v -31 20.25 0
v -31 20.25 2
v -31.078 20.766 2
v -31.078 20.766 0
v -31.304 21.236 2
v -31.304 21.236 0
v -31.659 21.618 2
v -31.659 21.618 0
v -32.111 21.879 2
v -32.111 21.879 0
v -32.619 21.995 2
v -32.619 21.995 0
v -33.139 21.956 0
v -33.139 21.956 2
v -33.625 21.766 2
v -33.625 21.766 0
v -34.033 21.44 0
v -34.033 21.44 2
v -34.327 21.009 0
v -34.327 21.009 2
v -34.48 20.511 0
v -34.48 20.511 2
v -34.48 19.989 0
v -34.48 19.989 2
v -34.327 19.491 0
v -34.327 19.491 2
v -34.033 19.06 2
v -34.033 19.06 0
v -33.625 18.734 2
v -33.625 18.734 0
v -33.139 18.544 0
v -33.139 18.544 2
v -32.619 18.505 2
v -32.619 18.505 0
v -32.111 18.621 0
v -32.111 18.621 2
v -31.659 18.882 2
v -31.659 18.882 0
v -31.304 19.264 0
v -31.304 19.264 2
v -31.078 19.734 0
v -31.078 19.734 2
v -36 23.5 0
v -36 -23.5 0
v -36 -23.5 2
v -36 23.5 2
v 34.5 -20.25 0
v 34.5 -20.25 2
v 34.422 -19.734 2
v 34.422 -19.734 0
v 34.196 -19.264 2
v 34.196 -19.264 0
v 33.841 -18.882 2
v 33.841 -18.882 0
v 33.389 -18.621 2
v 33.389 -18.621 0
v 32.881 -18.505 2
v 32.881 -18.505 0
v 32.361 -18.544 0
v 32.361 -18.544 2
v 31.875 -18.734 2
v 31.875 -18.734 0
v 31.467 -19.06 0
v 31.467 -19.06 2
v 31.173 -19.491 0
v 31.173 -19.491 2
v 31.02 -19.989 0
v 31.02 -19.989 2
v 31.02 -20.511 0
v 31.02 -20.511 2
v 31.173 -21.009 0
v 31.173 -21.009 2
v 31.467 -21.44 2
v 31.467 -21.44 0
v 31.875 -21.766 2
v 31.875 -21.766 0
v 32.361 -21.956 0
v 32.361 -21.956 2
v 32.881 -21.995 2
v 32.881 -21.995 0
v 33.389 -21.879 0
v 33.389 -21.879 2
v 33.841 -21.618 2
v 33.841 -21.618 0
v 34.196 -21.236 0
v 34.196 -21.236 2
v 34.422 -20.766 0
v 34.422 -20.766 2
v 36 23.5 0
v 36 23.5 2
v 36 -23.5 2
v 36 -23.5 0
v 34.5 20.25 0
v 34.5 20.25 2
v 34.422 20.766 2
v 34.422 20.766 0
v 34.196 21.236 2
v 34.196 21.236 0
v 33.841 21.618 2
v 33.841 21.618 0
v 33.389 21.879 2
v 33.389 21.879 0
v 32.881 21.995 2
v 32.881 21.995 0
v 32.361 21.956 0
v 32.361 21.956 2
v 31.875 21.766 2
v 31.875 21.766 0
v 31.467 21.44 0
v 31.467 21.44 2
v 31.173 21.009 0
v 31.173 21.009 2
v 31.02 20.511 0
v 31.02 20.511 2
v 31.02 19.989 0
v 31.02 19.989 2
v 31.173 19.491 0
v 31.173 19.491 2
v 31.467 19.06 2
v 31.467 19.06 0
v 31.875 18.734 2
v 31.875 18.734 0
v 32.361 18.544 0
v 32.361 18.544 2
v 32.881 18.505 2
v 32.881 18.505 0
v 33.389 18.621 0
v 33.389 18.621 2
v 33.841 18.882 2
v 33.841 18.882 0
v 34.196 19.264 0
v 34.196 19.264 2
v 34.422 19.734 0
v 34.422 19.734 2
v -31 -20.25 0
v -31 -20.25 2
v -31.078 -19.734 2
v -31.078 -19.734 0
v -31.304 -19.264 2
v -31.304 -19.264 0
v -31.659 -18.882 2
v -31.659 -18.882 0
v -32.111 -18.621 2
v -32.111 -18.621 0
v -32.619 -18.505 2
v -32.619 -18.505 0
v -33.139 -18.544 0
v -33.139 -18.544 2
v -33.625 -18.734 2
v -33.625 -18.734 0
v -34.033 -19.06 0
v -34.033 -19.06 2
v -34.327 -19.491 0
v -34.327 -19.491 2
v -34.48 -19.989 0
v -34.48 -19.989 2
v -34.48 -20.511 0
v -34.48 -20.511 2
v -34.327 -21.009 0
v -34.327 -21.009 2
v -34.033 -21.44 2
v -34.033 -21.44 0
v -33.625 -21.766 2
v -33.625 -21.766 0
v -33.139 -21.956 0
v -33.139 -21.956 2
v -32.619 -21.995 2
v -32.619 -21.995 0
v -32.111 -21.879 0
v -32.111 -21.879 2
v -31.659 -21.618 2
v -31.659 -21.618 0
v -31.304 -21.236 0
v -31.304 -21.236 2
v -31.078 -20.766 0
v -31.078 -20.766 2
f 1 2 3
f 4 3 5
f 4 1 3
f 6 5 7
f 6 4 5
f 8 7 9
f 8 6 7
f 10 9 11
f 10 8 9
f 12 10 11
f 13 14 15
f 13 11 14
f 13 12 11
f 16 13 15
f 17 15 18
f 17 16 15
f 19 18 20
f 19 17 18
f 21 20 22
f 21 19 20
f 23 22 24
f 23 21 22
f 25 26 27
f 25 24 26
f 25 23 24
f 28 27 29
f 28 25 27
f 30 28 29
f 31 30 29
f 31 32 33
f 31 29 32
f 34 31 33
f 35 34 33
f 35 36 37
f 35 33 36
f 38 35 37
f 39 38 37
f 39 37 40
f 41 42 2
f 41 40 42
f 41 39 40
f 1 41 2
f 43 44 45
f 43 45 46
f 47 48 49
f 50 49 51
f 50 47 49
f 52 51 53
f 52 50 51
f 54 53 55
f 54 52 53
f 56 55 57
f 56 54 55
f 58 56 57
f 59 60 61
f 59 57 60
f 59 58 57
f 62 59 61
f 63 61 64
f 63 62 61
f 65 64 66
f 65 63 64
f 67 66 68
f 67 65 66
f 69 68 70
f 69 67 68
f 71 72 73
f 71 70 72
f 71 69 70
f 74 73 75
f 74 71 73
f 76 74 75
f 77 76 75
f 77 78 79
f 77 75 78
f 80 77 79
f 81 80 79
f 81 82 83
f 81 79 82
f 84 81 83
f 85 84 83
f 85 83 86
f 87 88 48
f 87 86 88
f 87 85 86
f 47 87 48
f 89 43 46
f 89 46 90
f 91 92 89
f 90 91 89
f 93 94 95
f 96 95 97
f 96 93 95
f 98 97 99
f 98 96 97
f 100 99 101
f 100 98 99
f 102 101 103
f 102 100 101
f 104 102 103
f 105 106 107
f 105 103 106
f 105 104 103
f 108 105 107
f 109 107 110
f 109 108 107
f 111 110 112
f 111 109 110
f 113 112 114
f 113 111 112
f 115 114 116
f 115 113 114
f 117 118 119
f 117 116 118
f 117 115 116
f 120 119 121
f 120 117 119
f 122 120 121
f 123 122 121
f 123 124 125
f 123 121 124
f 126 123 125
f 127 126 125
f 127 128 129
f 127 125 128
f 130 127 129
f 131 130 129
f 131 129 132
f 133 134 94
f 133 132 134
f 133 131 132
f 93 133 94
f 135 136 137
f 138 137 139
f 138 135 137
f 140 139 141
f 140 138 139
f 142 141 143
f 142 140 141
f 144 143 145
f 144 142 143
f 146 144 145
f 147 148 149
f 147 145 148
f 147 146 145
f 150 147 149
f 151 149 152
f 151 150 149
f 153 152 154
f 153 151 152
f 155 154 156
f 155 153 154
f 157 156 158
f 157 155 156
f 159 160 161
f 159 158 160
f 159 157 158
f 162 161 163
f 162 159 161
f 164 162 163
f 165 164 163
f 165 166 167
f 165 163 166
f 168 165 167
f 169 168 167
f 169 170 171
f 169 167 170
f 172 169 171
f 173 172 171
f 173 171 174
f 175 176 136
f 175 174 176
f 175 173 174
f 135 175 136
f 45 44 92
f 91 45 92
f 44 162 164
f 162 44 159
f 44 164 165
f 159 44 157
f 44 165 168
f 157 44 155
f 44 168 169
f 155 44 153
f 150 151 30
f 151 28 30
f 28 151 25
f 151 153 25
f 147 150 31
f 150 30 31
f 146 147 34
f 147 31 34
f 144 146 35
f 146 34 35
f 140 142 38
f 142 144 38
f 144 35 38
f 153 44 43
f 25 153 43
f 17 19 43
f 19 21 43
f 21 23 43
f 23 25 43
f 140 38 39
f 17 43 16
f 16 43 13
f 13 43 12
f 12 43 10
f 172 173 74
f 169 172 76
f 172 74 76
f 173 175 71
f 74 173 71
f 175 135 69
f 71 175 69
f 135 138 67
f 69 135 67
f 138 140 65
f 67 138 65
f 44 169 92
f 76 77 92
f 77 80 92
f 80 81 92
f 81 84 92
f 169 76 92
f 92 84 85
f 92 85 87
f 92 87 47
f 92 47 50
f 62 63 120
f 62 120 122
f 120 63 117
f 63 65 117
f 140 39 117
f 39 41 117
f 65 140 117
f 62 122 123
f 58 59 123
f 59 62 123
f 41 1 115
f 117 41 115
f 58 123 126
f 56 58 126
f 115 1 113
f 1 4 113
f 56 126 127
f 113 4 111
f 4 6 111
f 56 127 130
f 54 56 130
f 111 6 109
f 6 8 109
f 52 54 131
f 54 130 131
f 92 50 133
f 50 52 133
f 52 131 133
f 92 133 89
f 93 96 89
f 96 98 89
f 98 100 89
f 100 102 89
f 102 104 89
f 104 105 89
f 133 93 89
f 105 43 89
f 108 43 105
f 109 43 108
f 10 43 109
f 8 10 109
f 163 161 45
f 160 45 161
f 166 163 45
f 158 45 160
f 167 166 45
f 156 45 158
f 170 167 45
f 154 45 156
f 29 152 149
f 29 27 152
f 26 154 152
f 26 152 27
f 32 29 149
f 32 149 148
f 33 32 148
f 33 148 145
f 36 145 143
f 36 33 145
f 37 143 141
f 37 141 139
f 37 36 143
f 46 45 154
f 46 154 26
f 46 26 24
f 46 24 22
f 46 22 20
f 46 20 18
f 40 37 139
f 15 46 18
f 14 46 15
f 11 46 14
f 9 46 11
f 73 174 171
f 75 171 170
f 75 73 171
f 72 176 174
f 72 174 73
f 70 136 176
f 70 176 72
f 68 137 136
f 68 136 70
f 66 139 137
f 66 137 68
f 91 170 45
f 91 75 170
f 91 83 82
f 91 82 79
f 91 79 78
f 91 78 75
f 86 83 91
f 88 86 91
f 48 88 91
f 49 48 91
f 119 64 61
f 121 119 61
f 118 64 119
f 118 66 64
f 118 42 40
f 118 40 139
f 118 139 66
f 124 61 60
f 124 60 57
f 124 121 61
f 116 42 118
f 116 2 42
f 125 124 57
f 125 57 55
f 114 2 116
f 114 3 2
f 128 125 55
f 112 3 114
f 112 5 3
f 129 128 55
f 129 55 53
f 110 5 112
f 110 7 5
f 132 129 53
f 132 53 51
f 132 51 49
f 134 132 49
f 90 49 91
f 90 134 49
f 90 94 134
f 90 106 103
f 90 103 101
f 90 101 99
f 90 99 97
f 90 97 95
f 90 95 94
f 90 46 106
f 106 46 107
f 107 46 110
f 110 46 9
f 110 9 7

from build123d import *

# Parameters (mm, degrees)
SKETCH1_W               = 72
SKETCH1_H               = 47
BOSS_EXTRUDE1_DEPTH     = 2
SKETCH2_R               = 1.75
CUT_EXTRUDE1_DEPTH      = 3
CUT_EXTRUDE1_DEPTH_BACK = 1


with BuildPart() as part:
    # Sketch1 → Boss-Extrude1 (new body)
    with BuildSketch(Plane.XY):
        Rectangle(SKETCH1_W, SKETCH1_H)
    extrude(amount=BOSS_EXTRUDE1_DEPTH)

    # Sketch2 → Cut-Extrude1 (cut, two sides)
    with BuildSketch(Plane.XY) as cut_extrude1_sk:
        with Locations((-32.75, 20.25)):
            Circle(SKETCH2_R)
        with Locations((32.75, 20.25)):
            Circle(SKETCH2_R)
        with Locations((32.75, -20.25)):
            Circle(SKETCH2_R)
        with Locations((-32.75, -20.25)):
            Circle(SKETCH2_R)
    extrude(amount=CUT_EXTRUDE1_DEPTH, mode=Mode.SUBTRACT)
    extrude(cut_extrude1_sk.sketch, amount=-CUT_EXTRUDE1_DEPTH_BACK, mode=Mode.SUBTRACT)


solid = part.part
